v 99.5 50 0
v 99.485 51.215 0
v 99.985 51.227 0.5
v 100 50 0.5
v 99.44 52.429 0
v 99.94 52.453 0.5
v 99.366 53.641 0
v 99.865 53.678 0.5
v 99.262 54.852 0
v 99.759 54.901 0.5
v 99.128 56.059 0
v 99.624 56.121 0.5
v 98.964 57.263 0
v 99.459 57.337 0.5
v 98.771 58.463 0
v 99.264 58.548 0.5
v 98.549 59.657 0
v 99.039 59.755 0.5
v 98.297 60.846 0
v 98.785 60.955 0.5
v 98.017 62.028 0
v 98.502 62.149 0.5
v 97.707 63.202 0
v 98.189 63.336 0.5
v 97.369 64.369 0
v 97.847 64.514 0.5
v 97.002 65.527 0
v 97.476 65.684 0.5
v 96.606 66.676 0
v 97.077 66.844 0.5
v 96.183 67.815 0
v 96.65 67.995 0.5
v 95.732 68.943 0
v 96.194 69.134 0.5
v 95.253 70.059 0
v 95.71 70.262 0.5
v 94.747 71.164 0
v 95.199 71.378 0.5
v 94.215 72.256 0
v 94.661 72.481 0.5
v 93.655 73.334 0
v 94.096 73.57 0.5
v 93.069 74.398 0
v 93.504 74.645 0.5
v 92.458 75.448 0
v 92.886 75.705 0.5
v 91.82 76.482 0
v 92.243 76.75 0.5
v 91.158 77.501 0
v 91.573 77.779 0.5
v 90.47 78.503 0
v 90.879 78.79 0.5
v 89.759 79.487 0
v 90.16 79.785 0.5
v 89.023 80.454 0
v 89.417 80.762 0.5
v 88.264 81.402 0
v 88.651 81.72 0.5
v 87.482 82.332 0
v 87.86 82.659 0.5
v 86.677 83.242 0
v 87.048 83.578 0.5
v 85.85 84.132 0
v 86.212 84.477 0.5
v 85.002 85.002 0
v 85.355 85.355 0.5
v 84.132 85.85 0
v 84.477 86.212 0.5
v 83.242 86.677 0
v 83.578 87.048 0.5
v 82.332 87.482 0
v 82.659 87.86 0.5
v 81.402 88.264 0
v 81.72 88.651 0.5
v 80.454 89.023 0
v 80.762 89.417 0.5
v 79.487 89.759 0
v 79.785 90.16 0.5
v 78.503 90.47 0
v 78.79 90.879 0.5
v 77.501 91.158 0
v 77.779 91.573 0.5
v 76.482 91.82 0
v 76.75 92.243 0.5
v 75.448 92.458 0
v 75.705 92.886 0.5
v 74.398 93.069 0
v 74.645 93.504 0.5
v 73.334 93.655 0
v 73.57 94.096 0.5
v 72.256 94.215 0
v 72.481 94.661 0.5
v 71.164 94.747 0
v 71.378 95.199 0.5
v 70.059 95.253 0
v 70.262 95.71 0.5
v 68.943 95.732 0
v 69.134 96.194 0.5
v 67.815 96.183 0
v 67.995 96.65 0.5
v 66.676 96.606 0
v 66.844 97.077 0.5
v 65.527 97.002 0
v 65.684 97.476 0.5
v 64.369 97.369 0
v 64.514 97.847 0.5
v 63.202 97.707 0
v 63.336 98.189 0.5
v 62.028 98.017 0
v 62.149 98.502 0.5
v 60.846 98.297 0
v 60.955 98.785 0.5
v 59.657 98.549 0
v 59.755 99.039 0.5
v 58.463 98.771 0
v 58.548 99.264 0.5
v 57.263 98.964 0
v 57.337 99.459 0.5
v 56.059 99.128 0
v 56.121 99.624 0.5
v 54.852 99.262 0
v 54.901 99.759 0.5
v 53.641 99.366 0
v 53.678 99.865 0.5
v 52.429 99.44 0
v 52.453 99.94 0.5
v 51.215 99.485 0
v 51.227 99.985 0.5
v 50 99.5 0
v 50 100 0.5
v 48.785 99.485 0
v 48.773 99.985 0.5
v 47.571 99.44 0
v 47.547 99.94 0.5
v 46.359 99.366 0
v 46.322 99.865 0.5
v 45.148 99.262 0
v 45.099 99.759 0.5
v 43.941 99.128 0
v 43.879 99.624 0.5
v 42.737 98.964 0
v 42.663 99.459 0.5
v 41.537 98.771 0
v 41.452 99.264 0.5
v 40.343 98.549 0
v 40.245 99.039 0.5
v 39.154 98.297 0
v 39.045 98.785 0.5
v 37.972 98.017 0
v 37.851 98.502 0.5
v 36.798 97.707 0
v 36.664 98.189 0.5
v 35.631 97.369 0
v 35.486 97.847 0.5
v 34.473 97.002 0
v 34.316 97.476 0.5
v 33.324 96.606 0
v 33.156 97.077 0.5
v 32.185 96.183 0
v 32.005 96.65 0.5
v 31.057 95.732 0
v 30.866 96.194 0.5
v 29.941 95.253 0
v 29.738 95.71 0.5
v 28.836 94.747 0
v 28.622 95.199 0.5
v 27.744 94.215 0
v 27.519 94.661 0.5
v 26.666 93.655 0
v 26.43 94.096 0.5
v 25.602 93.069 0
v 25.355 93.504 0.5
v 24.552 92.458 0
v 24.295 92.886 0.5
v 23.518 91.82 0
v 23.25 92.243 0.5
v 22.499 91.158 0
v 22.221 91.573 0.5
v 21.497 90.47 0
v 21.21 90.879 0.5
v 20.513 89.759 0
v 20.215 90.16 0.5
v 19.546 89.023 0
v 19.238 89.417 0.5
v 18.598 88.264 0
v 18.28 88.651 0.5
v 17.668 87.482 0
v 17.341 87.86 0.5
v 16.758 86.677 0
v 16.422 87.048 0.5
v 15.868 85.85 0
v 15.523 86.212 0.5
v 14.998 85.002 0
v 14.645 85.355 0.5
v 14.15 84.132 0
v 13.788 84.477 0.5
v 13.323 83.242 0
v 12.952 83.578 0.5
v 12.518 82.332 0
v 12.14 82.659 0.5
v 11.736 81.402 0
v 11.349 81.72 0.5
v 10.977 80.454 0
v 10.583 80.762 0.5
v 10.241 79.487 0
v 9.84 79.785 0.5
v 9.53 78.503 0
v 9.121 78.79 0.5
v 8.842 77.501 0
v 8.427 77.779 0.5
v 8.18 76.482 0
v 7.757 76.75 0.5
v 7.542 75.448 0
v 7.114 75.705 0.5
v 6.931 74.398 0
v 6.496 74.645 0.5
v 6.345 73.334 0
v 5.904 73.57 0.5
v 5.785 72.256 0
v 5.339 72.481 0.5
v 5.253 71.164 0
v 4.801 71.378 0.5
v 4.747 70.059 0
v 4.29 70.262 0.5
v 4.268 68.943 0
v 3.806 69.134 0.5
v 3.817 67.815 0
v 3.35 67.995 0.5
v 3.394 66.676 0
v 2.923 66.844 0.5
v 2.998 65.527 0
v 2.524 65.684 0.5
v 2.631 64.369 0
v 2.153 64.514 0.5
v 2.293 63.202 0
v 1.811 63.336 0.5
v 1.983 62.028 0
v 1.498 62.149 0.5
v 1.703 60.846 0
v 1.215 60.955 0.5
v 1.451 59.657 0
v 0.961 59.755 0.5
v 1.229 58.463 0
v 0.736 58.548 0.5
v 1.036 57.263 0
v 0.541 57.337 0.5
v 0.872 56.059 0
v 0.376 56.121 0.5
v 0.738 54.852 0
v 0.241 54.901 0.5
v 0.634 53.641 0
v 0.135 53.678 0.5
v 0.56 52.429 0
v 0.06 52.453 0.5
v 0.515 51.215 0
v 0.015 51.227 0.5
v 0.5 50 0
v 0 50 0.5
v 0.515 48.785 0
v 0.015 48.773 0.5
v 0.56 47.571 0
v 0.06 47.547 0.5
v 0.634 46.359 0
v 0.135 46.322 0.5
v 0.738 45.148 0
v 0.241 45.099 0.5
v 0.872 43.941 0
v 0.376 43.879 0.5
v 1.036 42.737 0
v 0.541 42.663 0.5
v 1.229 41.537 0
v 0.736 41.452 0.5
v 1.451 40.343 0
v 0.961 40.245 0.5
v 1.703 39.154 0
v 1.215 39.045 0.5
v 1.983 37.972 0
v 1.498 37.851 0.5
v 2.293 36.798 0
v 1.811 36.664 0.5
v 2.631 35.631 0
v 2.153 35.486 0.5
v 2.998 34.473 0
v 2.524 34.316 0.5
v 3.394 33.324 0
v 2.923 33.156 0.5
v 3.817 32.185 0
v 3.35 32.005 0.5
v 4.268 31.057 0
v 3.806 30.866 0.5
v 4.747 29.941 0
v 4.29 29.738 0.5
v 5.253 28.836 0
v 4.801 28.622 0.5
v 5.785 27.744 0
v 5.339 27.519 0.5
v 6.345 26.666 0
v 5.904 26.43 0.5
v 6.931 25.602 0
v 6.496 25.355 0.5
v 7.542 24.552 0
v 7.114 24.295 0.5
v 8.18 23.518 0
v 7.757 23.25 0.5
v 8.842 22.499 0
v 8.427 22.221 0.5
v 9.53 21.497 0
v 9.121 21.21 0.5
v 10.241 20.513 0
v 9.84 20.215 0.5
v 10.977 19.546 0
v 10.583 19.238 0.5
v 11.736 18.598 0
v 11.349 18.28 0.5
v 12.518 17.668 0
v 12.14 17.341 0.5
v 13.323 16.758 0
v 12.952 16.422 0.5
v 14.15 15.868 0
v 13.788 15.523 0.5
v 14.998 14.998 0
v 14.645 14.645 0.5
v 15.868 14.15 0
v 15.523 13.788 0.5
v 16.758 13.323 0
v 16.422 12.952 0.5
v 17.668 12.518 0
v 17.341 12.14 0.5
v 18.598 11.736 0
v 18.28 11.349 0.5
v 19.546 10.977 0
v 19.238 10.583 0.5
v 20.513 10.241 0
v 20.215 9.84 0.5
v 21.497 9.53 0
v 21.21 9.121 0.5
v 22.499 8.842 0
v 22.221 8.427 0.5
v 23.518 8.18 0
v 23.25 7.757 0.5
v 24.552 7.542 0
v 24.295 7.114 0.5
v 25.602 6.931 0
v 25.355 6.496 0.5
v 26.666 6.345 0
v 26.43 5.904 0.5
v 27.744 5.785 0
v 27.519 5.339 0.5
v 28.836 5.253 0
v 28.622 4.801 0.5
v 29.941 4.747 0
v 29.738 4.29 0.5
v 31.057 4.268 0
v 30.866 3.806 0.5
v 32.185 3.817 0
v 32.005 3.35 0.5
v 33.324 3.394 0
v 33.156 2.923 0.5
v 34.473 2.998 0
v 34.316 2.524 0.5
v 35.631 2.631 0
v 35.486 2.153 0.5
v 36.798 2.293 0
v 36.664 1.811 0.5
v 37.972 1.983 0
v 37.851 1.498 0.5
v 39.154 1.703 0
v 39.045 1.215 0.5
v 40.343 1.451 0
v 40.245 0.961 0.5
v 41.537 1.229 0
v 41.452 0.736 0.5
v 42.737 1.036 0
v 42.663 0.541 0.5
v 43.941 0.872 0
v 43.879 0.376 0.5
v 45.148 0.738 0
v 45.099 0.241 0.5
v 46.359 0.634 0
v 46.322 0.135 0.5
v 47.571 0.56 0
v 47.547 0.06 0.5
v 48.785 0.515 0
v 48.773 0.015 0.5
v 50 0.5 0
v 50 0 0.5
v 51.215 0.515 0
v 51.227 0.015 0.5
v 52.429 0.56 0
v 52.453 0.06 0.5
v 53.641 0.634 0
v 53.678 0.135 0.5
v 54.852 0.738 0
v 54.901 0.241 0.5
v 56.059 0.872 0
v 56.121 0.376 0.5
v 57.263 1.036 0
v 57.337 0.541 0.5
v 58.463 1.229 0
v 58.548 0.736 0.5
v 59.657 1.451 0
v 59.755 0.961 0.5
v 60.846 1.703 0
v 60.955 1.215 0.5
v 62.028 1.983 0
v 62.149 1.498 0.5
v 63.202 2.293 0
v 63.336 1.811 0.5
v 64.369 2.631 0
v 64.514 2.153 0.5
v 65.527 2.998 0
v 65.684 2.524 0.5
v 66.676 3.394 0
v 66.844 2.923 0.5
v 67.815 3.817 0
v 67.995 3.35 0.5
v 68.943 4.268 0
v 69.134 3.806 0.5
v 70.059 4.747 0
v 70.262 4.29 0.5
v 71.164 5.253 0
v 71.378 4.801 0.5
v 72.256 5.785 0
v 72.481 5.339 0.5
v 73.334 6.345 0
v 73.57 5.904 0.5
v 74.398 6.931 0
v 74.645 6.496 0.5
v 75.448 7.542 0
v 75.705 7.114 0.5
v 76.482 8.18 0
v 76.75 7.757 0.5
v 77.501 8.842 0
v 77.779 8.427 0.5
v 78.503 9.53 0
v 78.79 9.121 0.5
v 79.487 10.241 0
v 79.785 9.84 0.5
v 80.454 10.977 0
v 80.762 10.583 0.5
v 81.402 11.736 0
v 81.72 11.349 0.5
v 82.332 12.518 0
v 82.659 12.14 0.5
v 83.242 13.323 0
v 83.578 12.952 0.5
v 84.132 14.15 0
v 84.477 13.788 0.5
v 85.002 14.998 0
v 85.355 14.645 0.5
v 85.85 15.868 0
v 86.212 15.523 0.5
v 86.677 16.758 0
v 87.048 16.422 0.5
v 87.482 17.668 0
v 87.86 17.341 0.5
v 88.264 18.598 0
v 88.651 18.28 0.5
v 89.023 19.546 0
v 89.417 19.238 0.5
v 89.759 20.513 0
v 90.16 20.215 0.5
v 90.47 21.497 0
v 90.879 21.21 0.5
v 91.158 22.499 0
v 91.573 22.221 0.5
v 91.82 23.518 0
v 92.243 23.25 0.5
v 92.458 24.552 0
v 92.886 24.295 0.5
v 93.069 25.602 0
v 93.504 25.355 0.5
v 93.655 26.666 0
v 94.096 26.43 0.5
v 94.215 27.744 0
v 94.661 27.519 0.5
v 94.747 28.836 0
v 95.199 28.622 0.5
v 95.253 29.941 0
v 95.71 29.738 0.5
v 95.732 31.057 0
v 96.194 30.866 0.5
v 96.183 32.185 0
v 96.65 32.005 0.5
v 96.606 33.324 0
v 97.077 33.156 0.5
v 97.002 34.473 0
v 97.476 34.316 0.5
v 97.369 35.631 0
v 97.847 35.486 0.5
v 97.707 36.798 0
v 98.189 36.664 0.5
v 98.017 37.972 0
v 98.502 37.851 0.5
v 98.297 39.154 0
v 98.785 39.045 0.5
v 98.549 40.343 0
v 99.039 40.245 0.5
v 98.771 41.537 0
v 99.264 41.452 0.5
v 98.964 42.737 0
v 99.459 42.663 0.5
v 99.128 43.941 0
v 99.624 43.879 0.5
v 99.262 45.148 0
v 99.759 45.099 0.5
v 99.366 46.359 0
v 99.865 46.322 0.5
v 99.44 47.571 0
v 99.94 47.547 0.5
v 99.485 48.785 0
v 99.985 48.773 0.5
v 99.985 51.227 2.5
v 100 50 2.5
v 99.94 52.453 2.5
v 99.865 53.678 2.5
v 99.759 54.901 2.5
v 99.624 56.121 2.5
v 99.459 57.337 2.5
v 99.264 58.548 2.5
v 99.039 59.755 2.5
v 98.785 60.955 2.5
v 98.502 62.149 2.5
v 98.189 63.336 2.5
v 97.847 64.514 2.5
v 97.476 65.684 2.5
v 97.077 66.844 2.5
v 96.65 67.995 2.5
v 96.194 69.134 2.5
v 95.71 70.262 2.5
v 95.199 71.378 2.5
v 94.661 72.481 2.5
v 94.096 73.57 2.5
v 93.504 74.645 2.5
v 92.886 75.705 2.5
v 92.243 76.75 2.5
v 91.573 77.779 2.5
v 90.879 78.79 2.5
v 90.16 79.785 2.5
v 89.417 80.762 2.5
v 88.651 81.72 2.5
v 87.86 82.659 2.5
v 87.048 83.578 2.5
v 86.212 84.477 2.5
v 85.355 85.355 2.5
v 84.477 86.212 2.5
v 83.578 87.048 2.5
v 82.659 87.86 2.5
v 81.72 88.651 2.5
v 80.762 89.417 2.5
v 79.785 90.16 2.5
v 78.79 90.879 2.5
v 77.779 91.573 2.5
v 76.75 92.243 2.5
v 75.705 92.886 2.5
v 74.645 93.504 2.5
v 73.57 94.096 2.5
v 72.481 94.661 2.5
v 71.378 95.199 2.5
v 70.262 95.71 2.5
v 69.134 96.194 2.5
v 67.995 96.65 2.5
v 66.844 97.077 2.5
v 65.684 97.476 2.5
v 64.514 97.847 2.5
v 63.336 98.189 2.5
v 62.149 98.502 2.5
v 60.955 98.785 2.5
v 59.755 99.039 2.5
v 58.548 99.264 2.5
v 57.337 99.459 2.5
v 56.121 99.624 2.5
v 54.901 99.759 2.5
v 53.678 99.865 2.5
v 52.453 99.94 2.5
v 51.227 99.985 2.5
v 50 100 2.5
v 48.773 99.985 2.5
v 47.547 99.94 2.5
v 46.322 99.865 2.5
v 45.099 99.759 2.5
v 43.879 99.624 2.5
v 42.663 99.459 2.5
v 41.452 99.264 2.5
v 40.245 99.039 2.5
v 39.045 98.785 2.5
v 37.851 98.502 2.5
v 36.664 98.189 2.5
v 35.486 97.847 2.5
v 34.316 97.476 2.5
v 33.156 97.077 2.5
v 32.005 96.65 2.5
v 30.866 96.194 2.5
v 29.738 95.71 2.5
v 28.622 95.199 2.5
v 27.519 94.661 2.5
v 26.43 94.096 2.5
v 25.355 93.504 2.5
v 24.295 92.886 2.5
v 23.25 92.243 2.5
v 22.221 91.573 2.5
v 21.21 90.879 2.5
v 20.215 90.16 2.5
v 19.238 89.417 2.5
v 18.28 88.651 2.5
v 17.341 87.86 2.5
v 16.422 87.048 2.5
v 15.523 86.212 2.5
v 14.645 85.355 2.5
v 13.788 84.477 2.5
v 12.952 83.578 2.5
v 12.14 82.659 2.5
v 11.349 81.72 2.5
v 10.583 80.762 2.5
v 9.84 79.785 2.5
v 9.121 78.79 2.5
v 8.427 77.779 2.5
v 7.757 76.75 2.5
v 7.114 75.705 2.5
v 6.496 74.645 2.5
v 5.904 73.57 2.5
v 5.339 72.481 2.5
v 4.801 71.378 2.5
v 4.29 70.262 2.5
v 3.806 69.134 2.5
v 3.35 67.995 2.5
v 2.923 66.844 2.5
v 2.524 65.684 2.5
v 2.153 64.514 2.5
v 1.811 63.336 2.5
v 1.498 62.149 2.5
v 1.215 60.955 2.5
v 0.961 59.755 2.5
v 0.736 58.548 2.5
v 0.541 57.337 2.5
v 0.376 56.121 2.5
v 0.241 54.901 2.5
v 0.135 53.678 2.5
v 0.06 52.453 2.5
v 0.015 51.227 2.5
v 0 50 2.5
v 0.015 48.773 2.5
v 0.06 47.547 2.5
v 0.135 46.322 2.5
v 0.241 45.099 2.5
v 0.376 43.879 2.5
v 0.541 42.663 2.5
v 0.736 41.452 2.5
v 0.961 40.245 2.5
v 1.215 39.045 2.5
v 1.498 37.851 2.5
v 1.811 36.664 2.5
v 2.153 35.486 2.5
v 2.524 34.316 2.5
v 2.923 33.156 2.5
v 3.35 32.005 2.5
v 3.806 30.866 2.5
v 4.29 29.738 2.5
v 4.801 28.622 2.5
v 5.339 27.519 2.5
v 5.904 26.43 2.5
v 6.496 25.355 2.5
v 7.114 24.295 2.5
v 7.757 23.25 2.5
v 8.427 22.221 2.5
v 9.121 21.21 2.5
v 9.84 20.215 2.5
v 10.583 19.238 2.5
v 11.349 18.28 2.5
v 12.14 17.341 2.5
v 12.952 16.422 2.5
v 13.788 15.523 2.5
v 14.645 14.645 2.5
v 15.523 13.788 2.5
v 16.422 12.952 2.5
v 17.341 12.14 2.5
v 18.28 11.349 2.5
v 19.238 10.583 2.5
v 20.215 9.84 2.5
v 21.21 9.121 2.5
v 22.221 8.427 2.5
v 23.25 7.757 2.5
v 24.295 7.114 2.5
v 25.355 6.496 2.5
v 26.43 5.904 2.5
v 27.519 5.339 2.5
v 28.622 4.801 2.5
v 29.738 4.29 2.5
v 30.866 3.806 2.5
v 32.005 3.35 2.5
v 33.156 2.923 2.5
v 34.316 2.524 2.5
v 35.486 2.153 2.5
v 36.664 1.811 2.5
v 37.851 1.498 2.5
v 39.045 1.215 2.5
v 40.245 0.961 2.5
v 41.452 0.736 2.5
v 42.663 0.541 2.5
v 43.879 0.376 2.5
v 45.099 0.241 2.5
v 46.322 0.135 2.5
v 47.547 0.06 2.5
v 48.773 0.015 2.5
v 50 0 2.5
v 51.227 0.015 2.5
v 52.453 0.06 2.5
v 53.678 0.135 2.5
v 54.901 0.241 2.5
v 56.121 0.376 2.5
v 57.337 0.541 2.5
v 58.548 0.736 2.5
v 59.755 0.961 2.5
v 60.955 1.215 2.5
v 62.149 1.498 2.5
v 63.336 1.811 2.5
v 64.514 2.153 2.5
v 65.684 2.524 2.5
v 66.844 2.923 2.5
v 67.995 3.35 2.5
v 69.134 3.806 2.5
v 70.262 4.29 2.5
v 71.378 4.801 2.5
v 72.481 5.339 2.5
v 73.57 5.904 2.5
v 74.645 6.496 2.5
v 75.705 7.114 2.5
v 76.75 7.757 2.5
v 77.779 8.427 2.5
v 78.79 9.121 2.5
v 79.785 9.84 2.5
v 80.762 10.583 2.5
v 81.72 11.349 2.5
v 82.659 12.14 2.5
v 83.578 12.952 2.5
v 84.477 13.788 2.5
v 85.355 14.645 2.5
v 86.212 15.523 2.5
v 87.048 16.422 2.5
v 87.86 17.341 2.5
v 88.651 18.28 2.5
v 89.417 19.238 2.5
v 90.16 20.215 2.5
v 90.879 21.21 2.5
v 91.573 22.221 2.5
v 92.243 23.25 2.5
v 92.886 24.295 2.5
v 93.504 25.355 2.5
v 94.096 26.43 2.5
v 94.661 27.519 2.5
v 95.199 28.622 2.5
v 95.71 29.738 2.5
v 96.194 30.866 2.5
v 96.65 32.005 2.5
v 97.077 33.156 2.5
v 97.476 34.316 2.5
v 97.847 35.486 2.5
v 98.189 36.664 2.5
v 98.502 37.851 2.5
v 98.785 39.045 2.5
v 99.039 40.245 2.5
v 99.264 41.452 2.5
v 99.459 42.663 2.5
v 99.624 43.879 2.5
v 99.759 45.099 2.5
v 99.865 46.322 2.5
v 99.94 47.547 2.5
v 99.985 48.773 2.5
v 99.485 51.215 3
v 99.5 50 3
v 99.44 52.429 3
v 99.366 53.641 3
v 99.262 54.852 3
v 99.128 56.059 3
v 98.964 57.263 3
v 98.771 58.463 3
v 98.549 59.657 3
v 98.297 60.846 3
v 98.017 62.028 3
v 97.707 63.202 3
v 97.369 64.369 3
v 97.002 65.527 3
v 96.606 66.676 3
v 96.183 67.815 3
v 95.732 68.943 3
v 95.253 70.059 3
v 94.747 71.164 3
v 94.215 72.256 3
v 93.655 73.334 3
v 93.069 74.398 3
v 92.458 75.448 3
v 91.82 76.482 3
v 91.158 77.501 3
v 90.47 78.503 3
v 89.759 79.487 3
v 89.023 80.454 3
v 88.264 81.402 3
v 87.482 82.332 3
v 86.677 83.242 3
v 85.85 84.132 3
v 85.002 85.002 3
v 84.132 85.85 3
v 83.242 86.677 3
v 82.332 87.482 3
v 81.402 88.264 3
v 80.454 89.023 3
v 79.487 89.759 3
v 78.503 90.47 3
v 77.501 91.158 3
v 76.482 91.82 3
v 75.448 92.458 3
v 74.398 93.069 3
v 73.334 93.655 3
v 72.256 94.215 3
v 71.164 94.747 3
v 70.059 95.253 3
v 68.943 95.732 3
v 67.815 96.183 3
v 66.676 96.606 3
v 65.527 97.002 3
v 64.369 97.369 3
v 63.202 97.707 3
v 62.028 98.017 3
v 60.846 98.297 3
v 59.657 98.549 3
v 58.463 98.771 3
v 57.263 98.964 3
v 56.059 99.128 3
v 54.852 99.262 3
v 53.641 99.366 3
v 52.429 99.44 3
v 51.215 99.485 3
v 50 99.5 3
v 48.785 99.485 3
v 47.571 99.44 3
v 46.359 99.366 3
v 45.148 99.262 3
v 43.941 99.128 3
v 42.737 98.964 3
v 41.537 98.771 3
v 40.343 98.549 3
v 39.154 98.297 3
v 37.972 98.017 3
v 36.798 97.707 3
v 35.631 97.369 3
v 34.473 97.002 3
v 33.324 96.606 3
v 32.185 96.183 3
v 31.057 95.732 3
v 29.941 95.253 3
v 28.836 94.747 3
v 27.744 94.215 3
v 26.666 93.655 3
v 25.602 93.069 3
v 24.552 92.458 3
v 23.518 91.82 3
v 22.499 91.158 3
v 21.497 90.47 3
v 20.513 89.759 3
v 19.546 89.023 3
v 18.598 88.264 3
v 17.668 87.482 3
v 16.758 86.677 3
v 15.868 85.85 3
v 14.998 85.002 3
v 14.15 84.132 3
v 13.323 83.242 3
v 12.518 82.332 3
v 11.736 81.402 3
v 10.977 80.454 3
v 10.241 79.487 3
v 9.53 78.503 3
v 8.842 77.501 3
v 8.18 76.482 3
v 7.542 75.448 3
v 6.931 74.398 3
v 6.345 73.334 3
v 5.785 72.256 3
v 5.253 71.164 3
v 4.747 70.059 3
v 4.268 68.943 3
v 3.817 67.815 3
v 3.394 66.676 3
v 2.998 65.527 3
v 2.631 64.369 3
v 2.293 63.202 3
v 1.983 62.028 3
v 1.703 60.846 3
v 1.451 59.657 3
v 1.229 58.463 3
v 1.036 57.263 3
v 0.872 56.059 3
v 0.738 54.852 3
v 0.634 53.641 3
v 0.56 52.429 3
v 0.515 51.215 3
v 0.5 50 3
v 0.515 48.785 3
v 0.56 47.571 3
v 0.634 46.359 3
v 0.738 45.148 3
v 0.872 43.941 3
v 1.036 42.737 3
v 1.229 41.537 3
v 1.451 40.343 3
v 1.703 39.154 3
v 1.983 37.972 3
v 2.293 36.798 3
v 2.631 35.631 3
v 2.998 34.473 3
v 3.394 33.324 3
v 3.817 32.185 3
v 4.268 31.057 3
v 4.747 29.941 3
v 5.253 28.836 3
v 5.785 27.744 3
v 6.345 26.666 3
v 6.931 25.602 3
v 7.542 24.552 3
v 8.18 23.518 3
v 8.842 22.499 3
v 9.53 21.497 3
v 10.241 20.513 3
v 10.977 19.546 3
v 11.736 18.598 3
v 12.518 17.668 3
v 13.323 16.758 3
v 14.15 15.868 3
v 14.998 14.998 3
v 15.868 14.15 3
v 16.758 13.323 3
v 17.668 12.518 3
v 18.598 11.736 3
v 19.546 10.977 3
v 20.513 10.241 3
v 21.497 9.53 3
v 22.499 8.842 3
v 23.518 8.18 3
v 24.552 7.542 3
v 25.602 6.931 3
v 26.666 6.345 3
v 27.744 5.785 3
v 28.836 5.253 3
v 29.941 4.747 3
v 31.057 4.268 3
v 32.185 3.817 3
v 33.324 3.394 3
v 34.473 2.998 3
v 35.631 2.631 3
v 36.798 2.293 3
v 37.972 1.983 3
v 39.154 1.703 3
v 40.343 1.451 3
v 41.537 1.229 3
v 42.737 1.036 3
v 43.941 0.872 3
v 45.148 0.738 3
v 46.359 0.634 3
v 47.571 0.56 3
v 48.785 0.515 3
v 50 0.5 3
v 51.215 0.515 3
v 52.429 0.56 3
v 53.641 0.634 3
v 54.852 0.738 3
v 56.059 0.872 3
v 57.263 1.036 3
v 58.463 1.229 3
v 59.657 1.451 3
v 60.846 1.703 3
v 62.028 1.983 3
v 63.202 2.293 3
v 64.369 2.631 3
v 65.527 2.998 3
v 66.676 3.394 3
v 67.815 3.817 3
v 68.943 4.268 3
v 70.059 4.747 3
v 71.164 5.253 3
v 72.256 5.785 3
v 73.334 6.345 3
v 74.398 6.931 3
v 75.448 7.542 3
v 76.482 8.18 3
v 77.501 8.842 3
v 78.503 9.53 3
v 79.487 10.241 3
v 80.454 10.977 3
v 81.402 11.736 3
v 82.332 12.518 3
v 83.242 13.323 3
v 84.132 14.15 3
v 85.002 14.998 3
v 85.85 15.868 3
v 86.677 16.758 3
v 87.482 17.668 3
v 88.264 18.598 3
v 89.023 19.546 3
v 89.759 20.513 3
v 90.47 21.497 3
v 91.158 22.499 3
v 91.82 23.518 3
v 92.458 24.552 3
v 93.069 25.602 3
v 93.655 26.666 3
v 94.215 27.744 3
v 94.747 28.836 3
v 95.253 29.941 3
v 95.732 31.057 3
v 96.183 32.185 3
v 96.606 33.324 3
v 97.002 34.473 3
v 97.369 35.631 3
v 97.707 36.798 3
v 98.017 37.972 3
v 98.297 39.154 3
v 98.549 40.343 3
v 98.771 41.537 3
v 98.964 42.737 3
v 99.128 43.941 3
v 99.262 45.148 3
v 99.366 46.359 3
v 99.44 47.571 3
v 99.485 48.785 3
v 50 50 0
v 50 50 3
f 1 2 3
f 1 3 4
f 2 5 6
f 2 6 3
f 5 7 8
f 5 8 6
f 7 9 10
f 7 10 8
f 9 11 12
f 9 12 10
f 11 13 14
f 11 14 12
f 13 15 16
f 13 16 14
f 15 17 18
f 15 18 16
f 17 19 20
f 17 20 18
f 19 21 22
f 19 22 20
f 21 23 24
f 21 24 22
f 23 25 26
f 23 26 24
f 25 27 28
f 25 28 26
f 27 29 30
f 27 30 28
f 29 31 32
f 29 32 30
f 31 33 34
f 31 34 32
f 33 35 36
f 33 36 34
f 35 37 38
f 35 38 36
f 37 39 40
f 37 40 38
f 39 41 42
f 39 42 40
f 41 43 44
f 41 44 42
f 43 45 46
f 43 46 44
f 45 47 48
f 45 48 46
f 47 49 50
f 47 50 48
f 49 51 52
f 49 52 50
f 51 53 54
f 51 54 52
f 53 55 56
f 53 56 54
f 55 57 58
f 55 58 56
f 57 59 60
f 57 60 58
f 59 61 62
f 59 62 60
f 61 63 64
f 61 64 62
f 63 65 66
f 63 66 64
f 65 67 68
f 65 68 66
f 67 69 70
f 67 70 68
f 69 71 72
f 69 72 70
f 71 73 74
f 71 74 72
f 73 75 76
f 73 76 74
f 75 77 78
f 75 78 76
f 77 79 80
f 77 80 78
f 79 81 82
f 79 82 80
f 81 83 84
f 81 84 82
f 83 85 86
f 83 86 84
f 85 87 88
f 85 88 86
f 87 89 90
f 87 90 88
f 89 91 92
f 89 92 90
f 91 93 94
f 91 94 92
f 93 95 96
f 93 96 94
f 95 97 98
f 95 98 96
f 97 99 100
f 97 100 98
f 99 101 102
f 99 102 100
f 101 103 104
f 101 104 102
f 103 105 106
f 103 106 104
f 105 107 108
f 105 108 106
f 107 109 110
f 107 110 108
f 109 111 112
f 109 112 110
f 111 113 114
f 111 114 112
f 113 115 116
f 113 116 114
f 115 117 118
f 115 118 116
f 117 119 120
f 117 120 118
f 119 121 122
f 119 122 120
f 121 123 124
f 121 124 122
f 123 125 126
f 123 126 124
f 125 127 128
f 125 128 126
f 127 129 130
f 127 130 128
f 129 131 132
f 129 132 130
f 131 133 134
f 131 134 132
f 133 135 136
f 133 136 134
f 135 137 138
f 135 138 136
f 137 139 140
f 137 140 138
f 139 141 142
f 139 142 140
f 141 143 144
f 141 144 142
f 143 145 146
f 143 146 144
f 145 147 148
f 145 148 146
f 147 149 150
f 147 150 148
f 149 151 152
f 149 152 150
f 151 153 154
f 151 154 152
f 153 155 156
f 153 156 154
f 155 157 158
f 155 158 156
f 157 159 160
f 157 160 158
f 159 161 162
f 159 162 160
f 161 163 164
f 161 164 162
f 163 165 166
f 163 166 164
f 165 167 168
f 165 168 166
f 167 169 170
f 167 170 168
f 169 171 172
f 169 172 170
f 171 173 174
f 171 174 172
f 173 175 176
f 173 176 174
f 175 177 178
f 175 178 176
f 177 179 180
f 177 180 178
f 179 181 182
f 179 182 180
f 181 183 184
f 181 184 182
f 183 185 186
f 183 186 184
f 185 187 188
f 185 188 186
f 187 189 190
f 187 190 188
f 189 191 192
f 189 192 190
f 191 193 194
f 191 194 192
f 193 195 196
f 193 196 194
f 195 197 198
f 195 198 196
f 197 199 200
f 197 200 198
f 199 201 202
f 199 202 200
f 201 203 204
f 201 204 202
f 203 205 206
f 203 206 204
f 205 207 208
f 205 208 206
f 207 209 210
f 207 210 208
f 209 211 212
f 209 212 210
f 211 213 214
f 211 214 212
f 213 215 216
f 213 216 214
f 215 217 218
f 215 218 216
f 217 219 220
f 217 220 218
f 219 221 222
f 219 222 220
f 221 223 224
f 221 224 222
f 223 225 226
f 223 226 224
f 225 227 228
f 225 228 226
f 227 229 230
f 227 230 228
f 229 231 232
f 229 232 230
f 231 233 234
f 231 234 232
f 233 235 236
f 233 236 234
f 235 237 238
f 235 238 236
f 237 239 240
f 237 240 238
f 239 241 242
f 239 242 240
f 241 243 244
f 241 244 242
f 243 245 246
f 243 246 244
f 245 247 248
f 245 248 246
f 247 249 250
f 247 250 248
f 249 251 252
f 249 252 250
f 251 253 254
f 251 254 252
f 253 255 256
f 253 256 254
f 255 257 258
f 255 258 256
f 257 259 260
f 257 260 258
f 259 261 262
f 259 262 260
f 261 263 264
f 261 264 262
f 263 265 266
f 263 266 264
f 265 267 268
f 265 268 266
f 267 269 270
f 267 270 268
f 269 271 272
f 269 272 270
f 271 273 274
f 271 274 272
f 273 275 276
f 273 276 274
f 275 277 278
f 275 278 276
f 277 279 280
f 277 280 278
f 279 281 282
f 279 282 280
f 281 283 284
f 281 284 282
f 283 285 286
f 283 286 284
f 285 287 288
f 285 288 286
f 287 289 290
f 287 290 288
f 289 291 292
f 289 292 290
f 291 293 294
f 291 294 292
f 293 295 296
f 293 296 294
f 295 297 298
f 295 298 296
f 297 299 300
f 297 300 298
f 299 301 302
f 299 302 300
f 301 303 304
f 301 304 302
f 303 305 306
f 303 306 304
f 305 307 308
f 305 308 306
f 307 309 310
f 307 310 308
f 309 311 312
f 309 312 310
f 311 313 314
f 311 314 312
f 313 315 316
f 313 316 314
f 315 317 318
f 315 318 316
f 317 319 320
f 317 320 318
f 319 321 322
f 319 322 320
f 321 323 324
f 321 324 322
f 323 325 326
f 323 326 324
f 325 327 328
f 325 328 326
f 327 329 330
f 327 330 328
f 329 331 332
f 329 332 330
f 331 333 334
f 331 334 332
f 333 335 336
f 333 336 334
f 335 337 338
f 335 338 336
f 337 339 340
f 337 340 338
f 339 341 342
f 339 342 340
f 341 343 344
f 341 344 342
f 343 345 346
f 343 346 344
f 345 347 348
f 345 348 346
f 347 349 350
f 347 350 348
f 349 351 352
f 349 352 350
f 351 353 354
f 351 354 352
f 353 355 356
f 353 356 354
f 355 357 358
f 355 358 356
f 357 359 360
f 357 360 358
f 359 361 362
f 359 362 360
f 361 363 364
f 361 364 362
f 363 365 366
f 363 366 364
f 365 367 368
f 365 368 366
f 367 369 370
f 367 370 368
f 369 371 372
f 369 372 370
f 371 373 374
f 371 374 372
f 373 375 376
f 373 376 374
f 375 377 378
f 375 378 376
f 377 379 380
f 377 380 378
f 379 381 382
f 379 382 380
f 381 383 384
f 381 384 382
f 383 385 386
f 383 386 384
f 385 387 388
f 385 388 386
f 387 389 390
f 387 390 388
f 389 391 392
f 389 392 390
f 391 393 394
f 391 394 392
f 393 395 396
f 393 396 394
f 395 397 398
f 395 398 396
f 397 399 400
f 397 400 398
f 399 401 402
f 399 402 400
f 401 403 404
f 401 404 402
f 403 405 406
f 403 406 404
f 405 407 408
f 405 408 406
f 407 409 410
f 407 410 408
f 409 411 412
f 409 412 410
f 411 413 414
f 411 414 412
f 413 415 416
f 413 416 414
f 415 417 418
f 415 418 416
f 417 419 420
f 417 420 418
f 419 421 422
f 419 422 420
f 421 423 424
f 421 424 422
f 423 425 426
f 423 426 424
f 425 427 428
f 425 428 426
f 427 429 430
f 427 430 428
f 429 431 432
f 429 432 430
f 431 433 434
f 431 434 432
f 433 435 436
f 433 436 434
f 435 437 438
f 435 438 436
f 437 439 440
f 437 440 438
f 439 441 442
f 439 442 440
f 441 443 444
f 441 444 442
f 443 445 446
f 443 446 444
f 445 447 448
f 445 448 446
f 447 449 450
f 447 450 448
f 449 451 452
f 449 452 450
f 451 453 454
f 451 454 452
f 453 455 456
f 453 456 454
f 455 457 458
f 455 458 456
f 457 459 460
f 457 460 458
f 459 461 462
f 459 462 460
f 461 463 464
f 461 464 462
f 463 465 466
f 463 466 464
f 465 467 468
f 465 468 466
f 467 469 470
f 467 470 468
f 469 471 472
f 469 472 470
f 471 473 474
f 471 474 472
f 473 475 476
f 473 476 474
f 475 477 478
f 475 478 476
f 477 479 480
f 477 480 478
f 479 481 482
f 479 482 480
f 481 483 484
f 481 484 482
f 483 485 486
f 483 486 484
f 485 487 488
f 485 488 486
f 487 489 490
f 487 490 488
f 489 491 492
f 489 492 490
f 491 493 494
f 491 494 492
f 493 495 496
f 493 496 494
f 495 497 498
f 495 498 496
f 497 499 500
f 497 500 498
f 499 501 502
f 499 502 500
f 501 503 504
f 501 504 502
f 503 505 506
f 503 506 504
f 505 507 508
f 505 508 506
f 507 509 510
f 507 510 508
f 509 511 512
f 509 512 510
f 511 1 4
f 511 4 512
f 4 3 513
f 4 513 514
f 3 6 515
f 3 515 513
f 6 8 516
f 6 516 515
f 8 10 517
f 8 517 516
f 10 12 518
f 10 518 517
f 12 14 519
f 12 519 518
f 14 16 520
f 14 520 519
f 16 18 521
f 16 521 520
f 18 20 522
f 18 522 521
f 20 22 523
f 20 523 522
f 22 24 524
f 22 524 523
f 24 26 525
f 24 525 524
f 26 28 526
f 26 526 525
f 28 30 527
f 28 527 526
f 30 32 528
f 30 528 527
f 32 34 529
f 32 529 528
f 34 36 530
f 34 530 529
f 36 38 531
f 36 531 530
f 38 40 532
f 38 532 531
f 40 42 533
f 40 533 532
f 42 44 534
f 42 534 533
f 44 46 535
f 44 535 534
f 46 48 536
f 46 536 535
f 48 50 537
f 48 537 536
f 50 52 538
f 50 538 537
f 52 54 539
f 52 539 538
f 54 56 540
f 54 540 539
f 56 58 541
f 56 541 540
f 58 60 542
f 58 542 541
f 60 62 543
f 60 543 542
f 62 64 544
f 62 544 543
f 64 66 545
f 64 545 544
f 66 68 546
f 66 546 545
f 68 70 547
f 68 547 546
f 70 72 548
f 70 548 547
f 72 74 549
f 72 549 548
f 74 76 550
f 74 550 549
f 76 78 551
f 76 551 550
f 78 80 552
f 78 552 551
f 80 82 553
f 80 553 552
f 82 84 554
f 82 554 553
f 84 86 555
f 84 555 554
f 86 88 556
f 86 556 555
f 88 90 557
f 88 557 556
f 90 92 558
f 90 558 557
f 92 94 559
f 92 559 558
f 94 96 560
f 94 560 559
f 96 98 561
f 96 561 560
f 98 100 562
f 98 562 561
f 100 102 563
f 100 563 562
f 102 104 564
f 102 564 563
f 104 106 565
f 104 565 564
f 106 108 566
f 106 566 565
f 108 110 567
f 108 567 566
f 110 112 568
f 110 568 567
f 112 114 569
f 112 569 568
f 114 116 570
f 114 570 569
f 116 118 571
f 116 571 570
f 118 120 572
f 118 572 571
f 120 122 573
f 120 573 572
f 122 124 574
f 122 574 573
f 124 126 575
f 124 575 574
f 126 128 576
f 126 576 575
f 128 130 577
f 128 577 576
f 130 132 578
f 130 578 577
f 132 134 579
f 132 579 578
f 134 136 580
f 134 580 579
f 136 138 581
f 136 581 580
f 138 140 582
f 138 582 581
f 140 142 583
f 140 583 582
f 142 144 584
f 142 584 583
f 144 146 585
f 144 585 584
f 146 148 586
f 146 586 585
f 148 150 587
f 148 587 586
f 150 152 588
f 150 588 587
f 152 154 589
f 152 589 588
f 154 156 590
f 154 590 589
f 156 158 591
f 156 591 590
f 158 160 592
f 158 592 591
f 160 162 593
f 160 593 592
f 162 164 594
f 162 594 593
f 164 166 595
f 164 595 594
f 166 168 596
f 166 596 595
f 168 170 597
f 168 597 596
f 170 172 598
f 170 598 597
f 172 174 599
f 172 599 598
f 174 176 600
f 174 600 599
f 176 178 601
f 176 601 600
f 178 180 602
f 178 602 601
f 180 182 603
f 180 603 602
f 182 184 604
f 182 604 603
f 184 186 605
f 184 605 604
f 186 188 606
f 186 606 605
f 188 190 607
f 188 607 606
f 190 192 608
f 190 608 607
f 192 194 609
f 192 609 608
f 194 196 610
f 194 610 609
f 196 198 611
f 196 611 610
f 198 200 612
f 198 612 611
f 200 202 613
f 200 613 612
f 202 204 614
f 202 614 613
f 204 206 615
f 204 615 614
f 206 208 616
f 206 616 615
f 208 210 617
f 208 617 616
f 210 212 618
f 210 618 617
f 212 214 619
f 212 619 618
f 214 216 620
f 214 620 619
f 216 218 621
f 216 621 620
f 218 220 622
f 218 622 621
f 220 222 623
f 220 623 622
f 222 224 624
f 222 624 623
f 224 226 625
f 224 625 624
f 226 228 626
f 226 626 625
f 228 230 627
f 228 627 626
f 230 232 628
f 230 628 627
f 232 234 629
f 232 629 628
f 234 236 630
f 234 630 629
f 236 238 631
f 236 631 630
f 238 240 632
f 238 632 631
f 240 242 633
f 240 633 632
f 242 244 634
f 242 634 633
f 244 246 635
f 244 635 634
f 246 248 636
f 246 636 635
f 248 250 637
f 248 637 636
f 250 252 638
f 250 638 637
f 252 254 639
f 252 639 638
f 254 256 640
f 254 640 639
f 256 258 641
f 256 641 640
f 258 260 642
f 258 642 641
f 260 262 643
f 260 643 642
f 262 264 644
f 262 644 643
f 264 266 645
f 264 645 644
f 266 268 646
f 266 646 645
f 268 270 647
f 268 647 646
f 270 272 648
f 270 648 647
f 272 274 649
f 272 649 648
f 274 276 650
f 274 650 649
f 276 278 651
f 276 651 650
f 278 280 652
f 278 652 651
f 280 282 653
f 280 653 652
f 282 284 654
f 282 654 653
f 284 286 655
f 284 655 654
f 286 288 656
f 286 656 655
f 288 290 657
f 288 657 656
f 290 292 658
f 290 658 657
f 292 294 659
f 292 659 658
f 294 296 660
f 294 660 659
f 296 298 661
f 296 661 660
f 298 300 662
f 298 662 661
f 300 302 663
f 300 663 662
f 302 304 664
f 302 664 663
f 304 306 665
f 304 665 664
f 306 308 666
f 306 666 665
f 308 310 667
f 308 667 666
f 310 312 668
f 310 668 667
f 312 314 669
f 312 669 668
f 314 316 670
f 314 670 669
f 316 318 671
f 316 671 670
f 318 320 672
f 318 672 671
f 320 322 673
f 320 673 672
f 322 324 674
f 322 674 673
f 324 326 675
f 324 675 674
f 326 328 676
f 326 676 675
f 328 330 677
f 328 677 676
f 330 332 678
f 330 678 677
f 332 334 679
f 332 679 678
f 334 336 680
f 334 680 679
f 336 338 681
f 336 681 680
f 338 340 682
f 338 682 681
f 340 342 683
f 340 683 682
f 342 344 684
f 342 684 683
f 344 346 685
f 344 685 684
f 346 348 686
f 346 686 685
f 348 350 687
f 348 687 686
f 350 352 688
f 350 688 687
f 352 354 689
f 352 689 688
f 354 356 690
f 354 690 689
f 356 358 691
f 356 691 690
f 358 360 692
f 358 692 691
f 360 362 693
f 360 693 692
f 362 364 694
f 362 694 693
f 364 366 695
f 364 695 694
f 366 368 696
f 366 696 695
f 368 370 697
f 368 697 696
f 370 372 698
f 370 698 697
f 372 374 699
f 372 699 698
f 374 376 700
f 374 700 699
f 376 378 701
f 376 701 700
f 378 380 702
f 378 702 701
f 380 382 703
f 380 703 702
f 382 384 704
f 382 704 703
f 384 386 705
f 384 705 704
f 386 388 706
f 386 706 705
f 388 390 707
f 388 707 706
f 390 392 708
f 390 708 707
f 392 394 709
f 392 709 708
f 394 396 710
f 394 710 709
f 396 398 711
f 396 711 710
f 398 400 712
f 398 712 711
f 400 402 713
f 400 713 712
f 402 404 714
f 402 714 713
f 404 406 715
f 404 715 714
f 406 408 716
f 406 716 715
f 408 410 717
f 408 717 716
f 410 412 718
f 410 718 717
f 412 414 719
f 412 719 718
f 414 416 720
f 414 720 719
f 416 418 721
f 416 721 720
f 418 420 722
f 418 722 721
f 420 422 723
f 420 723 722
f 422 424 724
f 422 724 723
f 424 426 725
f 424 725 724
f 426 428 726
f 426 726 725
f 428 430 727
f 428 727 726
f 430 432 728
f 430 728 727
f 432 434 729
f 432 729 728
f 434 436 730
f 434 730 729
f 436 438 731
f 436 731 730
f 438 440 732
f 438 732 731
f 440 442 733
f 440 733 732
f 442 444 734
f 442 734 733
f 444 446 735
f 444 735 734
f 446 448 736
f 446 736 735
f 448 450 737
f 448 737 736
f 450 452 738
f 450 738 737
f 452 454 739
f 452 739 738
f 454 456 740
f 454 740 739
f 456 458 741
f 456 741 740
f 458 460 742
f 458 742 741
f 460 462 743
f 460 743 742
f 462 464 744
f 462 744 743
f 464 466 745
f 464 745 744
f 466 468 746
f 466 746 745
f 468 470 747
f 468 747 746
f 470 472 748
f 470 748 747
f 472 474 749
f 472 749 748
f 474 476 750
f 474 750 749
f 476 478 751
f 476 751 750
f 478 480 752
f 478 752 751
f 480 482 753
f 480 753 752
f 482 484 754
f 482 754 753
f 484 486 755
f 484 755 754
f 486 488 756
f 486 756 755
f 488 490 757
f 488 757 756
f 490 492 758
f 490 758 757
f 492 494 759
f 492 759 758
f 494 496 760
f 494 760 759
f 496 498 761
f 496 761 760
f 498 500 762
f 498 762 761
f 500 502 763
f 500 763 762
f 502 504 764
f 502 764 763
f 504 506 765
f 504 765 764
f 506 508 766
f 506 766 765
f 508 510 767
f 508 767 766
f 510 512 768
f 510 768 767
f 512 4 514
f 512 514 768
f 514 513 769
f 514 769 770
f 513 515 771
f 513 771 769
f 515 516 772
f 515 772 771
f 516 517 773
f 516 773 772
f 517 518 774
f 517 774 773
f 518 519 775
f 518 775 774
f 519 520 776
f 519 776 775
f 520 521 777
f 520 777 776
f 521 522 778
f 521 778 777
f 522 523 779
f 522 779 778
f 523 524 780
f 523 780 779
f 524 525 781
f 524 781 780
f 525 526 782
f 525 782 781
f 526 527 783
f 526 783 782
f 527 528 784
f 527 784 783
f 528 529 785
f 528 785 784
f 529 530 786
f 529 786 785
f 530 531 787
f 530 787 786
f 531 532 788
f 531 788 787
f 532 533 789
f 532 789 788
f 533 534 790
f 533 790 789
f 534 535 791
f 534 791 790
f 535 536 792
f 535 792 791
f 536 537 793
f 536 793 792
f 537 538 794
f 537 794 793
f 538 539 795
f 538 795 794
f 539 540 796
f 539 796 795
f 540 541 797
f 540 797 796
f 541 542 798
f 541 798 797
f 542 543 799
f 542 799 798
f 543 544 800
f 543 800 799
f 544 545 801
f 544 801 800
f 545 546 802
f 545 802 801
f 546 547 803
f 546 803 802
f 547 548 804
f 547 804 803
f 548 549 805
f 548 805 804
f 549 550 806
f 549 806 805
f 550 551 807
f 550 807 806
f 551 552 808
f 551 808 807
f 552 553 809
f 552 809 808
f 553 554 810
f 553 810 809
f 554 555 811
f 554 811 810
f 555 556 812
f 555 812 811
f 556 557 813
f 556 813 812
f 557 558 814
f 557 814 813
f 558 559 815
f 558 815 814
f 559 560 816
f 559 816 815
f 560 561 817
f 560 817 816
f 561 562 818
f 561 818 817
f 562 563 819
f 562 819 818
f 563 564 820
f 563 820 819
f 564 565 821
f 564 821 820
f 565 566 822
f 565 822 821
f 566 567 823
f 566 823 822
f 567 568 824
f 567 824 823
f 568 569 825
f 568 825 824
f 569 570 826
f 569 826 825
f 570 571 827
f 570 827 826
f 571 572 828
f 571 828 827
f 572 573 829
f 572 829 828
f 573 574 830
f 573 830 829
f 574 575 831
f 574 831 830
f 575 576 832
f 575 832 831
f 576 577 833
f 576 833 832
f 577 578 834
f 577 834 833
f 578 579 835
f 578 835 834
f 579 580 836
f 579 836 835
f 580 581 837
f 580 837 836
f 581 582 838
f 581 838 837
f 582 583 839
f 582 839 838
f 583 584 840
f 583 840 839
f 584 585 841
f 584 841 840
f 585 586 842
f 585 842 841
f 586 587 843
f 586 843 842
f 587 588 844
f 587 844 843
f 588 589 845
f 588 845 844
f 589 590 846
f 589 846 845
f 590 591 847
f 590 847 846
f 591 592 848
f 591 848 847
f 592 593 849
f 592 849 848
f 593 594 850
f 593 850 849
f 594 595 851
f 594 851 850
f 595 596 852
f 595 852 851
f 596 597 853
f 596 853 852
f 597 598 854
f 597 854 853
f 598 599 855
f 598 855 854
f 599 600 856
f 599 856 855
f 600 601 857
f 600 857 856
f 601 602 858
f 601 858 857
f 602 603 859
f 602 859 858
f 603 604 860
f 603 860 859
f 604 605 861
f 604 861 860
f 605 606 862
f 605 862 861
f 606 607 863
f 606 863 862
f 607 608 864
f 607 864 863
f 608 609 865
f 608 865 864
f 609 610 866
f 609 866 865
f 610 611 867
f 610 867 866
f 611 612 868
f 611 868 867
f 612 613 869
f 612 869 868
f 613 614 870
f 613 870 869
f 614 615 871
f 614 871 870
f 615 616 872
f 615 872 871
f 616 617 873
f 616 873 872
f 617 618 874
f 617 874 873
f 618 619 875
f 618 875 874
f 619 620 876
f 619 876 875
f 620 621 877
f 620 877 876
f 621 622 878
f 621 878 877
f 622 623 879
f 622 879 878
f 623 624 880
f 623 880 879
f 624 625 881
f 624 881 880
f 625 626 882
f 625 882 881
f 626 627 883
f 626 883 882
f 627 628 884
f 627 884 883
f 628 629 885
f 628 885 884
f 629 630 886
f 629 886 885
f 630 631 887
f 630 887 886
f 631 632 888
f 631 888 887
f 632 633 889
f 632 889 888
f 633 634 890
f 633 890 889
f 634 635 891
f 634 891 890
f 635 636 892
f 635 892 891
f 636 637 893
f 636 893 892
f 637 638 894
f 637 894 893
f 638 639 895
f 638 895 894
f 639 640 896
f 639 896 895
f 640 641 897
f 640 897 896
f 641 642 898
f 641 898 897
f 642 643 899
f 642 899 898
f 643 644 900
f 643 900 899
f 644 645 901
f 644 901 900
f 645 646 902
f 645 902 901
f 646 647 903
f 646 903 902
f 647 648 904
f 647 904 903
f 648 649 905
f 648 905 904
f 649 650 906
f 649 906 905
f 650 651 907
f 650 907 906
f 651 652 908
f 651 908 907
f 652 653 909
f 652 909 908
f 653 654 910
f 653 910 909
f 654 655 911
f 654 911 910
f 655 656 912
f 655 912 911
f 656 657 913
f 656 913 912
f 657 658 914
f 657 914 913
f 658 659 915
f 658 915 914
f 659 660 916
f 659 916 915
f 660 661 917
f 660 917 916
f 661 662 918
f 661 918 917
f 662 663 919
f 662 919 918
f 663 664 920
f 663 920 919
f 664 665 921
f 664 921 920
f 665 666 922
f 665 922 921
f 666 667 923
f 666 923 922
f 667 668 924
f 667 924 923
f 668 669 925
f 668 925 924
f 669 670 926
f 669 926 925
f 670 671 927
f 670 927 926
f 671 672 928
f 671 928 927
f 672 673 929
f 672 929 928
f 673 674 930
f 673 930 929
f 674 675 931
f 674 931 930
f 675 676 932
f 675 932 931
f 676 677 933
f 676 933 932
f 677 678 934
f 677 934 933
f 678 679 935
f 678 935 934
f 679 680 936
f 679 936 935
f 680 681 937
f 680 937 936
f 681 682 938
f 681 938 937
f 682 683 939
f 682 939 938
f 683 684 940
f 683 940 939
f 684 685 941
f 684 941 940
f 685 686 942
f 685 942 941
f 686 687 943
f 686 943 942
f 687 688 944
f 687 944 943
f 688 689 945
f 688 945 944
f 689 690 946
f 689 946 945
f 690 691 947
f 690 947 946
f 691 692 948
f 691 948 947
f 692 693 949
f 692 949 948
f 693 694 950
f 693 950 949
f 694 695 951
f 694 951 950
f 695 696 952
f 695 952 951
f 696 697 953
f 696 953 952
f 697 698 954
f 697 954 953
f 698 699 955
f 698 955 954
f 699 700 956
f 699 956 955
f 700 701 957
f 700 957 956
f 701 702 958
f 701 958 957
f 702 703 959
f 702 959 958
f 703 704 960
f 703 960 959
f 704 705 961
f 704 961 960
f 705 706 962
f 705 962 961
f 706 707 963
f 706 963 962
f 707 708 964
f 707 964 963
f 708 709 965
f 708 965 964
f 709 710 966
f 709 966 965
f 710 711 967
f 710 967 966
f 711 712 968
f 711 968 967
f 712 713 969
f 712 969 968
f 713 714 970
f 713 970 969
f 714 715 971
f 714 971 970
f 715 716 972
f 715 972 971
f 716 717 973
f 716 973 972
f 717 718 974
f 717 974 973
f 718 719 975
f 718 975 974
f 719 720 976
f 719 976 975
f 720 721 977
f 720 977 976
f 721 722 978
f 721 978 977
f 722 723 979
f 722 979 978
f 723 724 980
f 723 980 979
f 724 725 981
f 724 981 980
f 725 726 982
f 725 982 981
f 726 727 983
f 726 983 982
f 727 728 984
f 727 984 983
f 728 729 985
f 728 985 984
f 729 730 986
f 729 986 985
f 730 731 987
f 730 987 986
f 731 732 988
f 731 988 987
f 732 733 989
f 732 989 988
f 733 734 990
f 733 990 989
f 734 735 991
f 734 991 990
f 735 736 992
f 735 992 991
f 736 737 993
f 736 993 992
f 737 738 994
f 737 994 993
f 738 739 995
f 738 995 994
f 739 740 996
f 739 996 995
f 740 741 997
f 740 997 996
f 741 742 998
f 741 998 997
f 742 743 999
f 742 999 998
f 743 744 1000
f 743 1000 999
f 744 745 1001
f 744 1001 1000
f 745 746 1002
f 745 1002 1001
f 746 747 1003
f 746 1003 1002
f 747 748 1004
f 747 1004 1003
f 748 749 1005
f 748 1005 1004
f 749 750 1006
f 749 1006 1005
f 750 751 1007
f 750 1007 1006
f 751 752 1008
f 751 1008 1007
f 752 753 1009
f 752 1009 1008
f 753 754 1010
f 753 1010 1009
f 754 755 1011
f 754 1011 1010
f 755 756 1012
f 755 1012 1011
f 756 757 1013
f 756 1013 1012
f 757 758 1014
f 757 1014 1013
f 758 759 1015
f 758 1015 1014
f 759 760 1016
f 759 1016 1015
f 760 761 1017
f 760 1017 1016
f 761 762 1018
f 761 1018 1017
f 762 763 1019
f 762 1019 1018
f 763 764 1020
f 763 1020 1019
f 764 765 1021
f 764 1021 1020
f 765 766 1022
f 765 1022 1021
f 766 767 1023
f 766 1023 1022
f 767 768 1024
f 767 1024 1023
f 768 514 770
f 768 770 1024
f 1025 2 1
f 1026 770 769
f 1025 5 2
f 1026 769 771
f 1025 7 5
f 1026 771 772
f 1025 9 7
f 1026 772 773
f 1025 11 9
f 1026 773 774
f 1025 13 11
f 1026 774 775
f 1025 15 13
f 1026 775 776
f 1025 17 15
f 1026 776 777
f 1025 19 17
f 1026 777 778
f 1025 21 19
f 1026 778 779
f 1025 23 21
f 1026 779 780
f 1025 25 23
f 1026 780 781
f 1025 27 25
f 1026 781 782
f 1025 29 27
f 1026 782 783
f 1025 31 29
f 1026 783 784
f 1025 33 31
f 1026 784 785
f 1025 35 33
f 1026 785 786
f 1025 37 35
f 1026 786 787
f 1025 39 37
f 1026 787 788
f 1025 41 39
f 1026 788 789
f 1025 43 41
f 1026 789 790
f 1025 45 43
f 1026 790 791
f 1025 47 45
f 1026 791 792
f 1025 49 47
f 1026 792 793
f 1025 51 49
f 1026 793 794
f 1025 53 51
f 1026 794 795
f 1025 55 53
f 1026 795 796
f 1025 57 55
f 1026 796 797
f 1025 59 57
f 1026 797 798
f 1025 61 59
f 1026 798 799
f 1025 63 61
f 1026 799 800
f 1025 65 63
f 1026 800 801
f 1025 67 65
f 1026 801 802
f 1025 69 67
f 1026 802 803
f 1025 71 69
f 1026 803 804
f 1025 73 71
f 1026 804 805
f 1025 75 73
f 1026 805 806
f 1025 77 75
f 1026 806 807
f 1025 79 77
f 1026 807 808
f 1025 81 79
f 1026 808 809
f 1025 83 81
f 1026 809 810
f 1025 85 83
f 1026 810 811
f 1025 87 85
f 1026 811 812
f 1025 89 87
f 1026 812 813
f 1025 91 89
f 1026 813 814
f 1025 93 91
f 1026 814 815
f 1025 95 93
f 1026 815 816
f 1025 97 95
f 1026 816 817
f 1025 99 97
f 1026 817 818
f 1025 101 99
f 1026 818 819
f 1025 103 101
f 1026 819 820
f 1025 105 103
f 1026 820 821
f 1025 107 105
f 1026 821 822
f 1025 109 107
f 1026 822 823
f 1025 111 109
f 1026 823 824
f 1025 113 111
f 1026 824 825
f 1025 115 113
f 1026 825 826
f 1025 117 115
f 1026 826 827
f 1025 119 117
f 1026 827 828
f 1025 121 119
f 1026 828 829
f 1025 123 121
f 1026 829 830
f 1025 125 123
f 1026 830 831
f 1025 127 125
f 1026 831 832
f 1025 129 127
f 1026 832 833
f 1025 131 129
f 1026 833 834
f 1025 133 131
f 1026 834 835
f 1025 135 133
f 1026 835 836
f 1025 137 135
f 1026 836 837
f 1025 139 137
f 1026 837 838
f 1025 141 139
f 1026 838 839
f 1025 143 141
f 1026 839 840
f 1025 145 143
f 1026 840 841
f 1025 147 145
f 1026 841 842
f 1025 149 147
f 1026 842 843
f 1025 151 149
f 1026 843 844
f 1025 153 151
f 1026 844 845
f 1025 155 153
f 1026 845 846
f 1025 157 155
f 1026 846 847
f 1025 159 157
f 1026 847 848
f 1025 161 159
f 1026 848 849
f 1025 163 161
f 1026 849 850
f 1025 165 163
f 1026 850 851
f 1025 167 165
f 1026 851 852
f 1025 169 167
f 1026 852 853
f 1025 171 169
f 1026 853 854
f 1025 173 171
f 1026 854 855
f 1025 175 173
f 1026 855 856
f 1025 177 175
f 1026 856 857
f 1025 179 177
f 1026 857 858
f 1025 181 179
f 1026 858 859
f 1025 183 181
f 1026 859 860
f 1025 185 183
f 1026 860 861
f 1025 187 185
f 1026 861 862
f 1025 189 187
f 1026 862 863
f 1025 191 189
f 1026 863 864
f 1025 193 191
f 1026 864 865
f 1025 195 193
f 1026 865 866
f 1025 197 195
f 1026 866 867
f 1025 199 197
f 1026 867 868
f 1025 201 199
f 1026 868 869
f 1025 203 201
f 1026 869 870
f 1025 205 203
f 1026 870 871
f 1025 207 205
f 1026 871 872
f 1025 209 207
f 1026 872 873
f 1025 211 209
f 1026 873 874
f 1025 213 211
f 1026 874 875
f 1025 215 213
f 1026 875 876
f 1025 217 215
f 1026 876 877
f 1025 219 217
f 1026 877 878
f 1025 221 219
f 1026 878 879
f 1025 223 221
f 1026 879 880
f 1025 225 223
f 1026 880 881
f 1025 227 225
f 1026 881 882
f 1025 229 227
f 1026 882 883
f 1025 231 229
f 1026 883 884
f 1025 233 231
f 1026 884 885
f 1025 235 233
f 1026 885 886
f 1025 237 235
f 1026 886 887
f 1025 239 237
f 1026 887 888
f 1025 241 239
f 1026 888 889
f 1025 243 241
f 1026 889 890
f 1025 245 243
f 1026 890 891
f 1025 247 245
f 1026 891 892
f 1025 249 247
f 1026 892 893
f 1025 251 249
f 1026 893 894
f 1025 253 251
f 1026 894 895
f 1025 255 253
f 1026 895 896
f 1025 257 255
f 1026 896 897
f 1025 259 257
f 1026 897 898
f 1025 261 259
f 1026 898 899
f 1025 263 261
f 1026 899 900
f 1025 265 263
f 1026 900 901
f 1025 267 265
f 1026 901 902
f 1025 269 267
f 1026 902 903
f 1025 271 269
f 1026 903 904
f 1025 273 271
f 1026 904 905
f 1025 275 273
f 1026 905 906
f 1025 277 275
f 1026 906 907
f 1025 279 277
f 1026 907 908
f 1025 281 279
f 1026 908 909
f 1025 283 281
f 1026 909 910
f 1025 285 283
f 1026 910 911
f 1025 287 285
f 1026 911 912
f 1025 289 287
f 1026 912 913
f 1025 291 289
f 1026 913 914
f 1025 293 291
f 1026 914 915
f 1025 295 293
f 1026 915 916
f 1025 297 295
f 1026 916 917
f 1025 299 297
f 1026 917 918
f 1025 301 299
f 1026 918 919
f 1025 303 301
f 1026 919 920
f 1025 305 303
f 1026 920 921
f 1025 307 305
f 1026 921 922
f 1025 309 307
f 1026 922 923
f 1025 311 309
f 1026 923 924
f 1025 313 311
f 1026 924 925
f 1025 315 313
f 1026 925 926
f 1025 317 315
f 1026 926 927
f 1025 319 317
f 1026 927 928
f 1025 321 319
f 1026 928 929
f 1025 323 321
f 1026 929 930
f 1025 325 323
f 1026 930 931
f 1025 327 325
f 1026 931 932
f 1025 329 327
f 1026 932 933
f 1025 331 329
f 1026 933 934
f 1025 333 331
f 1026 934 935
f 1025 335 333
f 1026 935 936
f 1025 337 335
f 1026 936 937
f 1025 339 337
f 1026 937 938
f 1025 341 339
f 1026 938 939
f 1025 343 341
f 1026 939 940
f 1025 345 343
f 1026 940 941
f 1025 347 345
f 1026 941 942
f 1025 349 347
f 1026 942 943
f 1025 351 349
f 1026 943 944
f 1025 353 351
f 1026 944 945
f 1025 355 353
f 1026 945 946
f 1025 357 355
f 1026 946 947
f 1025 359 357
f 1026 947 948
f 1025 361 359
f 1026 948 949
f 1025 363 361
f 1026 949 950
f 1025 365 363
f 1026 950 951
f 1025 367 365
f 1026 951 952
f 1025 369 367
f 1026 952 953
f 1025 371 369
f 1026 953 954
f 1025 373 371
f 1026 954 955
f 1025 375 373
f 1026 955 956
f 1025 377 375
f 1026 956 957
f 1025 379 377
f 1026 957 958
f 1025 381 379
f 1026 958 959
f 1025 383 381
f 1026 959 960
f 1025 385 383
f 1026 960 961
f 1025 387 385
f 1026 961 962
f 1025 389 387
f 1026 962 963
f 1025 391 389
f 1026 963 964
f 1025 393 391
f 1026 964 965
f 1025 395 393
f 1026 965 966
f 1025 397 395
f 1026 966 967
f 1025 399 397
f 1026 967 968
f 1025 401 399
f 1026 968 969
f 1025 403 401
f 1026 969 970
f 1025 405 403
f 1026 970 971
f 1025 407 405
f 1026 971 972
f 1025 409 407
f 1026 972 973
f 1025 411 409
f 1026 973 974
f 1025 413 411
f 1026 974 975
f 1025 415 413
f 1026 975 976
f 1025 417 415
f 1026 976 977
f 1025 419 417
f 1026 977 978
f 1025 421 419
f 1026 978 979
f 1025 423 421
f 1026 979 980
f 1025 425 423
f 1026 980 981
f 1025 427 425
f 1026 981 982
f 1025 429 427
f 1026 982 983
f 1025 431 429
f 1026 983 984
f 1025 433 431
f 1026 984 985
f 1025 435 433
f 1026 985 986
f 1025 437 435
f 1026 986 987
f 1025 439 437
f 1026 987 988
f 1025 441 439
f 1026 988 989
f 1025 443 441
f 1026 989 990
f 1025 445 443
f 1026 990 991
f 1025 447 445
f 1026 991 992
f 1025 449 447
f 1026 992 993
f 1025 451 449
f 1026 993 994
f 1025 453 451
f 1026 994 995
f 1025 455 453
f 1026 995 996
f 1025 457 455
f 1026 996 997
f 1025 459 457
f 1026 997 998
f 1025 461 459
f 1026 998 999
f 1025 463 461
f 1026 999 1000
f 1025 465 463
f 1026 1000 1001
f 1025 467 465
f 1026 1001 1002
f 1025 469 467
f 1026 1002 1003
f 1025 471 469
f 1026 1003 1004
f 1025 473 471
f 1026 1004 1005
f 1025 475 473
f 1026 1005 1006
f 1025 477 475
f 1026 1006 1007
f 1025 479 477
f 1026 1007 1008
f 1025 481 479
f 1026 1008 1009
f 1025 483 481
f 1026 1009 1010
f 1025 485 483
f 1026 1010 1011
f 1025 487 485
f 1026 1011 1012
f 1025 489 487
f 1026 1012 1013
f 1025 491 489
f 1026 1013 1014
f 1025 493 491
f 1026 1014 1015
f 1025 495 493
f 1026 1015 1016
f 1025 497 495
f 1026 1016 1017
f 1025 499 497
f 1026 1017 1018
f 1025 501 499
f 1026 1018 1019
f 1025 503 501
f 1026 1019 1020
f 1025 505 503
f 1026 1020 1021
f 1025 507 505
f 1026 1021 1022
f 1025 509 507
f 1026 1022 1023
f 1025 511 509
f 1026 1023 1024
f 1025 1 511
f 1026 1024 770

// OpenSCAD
// mm. R: plan-view corner radius. C: 45-degree top/bottom edge bevel.
diameter=100; length=diameter; width=diameter; thickness=3;
radius=0; bevel=0.5;
round_plate=true;
assert(min(length,width,thickness)>0);
assert(radius>=0 && radius<=min(length,width)/2);
assert(bevel>=0 && bevel<min(length,width,thickness)/2);
function ring(z,d)=round_plate ?
    [for(i=[0:255]) [length/2+(length/2-d)*cos(i*360/256),width/2+(width/2-d)*sin(i*360/256),z]] :
    let(r=max(0,radius-d), centers=[[length-d-r,width-d-r],[d+r,width-d-r],[d+r,d+r],[length-d-r,d+r]])
    [for(j=[0:3]) for(i=[0:64]) [centers[j][0]+r*cos(j*90+i*90/64),centers[j][1]+r*sin(j*90+i*90/64),z]];
rings=bevel==0?[[0,0],[thickness,0]]:
    (!round_plate && radius>0 && radius<bevel)?
    [[0,bevel],[bevel-radius,radius],[bevel,0],[thickness-bevel,0],[thickness-bevel+radius,radius],[thickness,bevel]]:
    [[0,bevel],[bevel,0],[thickness-bevel,0],[thickness,bevel]];
n=round_plate?256:260; nr=len(rings);
v=concat([for(pair=rings) each ring(pair[0],pair[1])],[[length/2,width/2,0],[length/2,width/2,thickness]]);
faces=concat(
 [for(j=[0:nr-2]) for(i=[0:n-1]) each [[j*n+i,j*n+(i+1)%n,(j+1)*n+(i+1)%n],[j*n+i,(j+1)*n+(i+1)%n,(j+1)*n+i]]],
 [for(i=[0:n-1]) each [[nr*n,(i+1)%n,i],[nr*n+1,(nr-1)*n+i,(nr-1)*n+(i+1)%n]]]);
// Weld collapsed corner vertices when R=0 or C>=R, then drop zero-area faces.
vr=[for(p=v) [for(q=p) round(q*1000000)/1000000]];
unique=[for(i=[0:len(vr)-1]) if(search([vr[i]],vr)[0]==i) vr[i]];
mapped=[for(f=faces) [for(i=f) search([vr[i]],unique)[0]]];
// OpenSCAD uses clockwise face winding viewed from outside.
polyhedron(points=unique,faces=[for(f=mapped)
    if(norm(cross(unique[f[1]]-unique[f[0]],unique[f[2]]-unique[f[0]]))>0.000000001)
    [f[2],f[1],f[0]]],convexity=10);
